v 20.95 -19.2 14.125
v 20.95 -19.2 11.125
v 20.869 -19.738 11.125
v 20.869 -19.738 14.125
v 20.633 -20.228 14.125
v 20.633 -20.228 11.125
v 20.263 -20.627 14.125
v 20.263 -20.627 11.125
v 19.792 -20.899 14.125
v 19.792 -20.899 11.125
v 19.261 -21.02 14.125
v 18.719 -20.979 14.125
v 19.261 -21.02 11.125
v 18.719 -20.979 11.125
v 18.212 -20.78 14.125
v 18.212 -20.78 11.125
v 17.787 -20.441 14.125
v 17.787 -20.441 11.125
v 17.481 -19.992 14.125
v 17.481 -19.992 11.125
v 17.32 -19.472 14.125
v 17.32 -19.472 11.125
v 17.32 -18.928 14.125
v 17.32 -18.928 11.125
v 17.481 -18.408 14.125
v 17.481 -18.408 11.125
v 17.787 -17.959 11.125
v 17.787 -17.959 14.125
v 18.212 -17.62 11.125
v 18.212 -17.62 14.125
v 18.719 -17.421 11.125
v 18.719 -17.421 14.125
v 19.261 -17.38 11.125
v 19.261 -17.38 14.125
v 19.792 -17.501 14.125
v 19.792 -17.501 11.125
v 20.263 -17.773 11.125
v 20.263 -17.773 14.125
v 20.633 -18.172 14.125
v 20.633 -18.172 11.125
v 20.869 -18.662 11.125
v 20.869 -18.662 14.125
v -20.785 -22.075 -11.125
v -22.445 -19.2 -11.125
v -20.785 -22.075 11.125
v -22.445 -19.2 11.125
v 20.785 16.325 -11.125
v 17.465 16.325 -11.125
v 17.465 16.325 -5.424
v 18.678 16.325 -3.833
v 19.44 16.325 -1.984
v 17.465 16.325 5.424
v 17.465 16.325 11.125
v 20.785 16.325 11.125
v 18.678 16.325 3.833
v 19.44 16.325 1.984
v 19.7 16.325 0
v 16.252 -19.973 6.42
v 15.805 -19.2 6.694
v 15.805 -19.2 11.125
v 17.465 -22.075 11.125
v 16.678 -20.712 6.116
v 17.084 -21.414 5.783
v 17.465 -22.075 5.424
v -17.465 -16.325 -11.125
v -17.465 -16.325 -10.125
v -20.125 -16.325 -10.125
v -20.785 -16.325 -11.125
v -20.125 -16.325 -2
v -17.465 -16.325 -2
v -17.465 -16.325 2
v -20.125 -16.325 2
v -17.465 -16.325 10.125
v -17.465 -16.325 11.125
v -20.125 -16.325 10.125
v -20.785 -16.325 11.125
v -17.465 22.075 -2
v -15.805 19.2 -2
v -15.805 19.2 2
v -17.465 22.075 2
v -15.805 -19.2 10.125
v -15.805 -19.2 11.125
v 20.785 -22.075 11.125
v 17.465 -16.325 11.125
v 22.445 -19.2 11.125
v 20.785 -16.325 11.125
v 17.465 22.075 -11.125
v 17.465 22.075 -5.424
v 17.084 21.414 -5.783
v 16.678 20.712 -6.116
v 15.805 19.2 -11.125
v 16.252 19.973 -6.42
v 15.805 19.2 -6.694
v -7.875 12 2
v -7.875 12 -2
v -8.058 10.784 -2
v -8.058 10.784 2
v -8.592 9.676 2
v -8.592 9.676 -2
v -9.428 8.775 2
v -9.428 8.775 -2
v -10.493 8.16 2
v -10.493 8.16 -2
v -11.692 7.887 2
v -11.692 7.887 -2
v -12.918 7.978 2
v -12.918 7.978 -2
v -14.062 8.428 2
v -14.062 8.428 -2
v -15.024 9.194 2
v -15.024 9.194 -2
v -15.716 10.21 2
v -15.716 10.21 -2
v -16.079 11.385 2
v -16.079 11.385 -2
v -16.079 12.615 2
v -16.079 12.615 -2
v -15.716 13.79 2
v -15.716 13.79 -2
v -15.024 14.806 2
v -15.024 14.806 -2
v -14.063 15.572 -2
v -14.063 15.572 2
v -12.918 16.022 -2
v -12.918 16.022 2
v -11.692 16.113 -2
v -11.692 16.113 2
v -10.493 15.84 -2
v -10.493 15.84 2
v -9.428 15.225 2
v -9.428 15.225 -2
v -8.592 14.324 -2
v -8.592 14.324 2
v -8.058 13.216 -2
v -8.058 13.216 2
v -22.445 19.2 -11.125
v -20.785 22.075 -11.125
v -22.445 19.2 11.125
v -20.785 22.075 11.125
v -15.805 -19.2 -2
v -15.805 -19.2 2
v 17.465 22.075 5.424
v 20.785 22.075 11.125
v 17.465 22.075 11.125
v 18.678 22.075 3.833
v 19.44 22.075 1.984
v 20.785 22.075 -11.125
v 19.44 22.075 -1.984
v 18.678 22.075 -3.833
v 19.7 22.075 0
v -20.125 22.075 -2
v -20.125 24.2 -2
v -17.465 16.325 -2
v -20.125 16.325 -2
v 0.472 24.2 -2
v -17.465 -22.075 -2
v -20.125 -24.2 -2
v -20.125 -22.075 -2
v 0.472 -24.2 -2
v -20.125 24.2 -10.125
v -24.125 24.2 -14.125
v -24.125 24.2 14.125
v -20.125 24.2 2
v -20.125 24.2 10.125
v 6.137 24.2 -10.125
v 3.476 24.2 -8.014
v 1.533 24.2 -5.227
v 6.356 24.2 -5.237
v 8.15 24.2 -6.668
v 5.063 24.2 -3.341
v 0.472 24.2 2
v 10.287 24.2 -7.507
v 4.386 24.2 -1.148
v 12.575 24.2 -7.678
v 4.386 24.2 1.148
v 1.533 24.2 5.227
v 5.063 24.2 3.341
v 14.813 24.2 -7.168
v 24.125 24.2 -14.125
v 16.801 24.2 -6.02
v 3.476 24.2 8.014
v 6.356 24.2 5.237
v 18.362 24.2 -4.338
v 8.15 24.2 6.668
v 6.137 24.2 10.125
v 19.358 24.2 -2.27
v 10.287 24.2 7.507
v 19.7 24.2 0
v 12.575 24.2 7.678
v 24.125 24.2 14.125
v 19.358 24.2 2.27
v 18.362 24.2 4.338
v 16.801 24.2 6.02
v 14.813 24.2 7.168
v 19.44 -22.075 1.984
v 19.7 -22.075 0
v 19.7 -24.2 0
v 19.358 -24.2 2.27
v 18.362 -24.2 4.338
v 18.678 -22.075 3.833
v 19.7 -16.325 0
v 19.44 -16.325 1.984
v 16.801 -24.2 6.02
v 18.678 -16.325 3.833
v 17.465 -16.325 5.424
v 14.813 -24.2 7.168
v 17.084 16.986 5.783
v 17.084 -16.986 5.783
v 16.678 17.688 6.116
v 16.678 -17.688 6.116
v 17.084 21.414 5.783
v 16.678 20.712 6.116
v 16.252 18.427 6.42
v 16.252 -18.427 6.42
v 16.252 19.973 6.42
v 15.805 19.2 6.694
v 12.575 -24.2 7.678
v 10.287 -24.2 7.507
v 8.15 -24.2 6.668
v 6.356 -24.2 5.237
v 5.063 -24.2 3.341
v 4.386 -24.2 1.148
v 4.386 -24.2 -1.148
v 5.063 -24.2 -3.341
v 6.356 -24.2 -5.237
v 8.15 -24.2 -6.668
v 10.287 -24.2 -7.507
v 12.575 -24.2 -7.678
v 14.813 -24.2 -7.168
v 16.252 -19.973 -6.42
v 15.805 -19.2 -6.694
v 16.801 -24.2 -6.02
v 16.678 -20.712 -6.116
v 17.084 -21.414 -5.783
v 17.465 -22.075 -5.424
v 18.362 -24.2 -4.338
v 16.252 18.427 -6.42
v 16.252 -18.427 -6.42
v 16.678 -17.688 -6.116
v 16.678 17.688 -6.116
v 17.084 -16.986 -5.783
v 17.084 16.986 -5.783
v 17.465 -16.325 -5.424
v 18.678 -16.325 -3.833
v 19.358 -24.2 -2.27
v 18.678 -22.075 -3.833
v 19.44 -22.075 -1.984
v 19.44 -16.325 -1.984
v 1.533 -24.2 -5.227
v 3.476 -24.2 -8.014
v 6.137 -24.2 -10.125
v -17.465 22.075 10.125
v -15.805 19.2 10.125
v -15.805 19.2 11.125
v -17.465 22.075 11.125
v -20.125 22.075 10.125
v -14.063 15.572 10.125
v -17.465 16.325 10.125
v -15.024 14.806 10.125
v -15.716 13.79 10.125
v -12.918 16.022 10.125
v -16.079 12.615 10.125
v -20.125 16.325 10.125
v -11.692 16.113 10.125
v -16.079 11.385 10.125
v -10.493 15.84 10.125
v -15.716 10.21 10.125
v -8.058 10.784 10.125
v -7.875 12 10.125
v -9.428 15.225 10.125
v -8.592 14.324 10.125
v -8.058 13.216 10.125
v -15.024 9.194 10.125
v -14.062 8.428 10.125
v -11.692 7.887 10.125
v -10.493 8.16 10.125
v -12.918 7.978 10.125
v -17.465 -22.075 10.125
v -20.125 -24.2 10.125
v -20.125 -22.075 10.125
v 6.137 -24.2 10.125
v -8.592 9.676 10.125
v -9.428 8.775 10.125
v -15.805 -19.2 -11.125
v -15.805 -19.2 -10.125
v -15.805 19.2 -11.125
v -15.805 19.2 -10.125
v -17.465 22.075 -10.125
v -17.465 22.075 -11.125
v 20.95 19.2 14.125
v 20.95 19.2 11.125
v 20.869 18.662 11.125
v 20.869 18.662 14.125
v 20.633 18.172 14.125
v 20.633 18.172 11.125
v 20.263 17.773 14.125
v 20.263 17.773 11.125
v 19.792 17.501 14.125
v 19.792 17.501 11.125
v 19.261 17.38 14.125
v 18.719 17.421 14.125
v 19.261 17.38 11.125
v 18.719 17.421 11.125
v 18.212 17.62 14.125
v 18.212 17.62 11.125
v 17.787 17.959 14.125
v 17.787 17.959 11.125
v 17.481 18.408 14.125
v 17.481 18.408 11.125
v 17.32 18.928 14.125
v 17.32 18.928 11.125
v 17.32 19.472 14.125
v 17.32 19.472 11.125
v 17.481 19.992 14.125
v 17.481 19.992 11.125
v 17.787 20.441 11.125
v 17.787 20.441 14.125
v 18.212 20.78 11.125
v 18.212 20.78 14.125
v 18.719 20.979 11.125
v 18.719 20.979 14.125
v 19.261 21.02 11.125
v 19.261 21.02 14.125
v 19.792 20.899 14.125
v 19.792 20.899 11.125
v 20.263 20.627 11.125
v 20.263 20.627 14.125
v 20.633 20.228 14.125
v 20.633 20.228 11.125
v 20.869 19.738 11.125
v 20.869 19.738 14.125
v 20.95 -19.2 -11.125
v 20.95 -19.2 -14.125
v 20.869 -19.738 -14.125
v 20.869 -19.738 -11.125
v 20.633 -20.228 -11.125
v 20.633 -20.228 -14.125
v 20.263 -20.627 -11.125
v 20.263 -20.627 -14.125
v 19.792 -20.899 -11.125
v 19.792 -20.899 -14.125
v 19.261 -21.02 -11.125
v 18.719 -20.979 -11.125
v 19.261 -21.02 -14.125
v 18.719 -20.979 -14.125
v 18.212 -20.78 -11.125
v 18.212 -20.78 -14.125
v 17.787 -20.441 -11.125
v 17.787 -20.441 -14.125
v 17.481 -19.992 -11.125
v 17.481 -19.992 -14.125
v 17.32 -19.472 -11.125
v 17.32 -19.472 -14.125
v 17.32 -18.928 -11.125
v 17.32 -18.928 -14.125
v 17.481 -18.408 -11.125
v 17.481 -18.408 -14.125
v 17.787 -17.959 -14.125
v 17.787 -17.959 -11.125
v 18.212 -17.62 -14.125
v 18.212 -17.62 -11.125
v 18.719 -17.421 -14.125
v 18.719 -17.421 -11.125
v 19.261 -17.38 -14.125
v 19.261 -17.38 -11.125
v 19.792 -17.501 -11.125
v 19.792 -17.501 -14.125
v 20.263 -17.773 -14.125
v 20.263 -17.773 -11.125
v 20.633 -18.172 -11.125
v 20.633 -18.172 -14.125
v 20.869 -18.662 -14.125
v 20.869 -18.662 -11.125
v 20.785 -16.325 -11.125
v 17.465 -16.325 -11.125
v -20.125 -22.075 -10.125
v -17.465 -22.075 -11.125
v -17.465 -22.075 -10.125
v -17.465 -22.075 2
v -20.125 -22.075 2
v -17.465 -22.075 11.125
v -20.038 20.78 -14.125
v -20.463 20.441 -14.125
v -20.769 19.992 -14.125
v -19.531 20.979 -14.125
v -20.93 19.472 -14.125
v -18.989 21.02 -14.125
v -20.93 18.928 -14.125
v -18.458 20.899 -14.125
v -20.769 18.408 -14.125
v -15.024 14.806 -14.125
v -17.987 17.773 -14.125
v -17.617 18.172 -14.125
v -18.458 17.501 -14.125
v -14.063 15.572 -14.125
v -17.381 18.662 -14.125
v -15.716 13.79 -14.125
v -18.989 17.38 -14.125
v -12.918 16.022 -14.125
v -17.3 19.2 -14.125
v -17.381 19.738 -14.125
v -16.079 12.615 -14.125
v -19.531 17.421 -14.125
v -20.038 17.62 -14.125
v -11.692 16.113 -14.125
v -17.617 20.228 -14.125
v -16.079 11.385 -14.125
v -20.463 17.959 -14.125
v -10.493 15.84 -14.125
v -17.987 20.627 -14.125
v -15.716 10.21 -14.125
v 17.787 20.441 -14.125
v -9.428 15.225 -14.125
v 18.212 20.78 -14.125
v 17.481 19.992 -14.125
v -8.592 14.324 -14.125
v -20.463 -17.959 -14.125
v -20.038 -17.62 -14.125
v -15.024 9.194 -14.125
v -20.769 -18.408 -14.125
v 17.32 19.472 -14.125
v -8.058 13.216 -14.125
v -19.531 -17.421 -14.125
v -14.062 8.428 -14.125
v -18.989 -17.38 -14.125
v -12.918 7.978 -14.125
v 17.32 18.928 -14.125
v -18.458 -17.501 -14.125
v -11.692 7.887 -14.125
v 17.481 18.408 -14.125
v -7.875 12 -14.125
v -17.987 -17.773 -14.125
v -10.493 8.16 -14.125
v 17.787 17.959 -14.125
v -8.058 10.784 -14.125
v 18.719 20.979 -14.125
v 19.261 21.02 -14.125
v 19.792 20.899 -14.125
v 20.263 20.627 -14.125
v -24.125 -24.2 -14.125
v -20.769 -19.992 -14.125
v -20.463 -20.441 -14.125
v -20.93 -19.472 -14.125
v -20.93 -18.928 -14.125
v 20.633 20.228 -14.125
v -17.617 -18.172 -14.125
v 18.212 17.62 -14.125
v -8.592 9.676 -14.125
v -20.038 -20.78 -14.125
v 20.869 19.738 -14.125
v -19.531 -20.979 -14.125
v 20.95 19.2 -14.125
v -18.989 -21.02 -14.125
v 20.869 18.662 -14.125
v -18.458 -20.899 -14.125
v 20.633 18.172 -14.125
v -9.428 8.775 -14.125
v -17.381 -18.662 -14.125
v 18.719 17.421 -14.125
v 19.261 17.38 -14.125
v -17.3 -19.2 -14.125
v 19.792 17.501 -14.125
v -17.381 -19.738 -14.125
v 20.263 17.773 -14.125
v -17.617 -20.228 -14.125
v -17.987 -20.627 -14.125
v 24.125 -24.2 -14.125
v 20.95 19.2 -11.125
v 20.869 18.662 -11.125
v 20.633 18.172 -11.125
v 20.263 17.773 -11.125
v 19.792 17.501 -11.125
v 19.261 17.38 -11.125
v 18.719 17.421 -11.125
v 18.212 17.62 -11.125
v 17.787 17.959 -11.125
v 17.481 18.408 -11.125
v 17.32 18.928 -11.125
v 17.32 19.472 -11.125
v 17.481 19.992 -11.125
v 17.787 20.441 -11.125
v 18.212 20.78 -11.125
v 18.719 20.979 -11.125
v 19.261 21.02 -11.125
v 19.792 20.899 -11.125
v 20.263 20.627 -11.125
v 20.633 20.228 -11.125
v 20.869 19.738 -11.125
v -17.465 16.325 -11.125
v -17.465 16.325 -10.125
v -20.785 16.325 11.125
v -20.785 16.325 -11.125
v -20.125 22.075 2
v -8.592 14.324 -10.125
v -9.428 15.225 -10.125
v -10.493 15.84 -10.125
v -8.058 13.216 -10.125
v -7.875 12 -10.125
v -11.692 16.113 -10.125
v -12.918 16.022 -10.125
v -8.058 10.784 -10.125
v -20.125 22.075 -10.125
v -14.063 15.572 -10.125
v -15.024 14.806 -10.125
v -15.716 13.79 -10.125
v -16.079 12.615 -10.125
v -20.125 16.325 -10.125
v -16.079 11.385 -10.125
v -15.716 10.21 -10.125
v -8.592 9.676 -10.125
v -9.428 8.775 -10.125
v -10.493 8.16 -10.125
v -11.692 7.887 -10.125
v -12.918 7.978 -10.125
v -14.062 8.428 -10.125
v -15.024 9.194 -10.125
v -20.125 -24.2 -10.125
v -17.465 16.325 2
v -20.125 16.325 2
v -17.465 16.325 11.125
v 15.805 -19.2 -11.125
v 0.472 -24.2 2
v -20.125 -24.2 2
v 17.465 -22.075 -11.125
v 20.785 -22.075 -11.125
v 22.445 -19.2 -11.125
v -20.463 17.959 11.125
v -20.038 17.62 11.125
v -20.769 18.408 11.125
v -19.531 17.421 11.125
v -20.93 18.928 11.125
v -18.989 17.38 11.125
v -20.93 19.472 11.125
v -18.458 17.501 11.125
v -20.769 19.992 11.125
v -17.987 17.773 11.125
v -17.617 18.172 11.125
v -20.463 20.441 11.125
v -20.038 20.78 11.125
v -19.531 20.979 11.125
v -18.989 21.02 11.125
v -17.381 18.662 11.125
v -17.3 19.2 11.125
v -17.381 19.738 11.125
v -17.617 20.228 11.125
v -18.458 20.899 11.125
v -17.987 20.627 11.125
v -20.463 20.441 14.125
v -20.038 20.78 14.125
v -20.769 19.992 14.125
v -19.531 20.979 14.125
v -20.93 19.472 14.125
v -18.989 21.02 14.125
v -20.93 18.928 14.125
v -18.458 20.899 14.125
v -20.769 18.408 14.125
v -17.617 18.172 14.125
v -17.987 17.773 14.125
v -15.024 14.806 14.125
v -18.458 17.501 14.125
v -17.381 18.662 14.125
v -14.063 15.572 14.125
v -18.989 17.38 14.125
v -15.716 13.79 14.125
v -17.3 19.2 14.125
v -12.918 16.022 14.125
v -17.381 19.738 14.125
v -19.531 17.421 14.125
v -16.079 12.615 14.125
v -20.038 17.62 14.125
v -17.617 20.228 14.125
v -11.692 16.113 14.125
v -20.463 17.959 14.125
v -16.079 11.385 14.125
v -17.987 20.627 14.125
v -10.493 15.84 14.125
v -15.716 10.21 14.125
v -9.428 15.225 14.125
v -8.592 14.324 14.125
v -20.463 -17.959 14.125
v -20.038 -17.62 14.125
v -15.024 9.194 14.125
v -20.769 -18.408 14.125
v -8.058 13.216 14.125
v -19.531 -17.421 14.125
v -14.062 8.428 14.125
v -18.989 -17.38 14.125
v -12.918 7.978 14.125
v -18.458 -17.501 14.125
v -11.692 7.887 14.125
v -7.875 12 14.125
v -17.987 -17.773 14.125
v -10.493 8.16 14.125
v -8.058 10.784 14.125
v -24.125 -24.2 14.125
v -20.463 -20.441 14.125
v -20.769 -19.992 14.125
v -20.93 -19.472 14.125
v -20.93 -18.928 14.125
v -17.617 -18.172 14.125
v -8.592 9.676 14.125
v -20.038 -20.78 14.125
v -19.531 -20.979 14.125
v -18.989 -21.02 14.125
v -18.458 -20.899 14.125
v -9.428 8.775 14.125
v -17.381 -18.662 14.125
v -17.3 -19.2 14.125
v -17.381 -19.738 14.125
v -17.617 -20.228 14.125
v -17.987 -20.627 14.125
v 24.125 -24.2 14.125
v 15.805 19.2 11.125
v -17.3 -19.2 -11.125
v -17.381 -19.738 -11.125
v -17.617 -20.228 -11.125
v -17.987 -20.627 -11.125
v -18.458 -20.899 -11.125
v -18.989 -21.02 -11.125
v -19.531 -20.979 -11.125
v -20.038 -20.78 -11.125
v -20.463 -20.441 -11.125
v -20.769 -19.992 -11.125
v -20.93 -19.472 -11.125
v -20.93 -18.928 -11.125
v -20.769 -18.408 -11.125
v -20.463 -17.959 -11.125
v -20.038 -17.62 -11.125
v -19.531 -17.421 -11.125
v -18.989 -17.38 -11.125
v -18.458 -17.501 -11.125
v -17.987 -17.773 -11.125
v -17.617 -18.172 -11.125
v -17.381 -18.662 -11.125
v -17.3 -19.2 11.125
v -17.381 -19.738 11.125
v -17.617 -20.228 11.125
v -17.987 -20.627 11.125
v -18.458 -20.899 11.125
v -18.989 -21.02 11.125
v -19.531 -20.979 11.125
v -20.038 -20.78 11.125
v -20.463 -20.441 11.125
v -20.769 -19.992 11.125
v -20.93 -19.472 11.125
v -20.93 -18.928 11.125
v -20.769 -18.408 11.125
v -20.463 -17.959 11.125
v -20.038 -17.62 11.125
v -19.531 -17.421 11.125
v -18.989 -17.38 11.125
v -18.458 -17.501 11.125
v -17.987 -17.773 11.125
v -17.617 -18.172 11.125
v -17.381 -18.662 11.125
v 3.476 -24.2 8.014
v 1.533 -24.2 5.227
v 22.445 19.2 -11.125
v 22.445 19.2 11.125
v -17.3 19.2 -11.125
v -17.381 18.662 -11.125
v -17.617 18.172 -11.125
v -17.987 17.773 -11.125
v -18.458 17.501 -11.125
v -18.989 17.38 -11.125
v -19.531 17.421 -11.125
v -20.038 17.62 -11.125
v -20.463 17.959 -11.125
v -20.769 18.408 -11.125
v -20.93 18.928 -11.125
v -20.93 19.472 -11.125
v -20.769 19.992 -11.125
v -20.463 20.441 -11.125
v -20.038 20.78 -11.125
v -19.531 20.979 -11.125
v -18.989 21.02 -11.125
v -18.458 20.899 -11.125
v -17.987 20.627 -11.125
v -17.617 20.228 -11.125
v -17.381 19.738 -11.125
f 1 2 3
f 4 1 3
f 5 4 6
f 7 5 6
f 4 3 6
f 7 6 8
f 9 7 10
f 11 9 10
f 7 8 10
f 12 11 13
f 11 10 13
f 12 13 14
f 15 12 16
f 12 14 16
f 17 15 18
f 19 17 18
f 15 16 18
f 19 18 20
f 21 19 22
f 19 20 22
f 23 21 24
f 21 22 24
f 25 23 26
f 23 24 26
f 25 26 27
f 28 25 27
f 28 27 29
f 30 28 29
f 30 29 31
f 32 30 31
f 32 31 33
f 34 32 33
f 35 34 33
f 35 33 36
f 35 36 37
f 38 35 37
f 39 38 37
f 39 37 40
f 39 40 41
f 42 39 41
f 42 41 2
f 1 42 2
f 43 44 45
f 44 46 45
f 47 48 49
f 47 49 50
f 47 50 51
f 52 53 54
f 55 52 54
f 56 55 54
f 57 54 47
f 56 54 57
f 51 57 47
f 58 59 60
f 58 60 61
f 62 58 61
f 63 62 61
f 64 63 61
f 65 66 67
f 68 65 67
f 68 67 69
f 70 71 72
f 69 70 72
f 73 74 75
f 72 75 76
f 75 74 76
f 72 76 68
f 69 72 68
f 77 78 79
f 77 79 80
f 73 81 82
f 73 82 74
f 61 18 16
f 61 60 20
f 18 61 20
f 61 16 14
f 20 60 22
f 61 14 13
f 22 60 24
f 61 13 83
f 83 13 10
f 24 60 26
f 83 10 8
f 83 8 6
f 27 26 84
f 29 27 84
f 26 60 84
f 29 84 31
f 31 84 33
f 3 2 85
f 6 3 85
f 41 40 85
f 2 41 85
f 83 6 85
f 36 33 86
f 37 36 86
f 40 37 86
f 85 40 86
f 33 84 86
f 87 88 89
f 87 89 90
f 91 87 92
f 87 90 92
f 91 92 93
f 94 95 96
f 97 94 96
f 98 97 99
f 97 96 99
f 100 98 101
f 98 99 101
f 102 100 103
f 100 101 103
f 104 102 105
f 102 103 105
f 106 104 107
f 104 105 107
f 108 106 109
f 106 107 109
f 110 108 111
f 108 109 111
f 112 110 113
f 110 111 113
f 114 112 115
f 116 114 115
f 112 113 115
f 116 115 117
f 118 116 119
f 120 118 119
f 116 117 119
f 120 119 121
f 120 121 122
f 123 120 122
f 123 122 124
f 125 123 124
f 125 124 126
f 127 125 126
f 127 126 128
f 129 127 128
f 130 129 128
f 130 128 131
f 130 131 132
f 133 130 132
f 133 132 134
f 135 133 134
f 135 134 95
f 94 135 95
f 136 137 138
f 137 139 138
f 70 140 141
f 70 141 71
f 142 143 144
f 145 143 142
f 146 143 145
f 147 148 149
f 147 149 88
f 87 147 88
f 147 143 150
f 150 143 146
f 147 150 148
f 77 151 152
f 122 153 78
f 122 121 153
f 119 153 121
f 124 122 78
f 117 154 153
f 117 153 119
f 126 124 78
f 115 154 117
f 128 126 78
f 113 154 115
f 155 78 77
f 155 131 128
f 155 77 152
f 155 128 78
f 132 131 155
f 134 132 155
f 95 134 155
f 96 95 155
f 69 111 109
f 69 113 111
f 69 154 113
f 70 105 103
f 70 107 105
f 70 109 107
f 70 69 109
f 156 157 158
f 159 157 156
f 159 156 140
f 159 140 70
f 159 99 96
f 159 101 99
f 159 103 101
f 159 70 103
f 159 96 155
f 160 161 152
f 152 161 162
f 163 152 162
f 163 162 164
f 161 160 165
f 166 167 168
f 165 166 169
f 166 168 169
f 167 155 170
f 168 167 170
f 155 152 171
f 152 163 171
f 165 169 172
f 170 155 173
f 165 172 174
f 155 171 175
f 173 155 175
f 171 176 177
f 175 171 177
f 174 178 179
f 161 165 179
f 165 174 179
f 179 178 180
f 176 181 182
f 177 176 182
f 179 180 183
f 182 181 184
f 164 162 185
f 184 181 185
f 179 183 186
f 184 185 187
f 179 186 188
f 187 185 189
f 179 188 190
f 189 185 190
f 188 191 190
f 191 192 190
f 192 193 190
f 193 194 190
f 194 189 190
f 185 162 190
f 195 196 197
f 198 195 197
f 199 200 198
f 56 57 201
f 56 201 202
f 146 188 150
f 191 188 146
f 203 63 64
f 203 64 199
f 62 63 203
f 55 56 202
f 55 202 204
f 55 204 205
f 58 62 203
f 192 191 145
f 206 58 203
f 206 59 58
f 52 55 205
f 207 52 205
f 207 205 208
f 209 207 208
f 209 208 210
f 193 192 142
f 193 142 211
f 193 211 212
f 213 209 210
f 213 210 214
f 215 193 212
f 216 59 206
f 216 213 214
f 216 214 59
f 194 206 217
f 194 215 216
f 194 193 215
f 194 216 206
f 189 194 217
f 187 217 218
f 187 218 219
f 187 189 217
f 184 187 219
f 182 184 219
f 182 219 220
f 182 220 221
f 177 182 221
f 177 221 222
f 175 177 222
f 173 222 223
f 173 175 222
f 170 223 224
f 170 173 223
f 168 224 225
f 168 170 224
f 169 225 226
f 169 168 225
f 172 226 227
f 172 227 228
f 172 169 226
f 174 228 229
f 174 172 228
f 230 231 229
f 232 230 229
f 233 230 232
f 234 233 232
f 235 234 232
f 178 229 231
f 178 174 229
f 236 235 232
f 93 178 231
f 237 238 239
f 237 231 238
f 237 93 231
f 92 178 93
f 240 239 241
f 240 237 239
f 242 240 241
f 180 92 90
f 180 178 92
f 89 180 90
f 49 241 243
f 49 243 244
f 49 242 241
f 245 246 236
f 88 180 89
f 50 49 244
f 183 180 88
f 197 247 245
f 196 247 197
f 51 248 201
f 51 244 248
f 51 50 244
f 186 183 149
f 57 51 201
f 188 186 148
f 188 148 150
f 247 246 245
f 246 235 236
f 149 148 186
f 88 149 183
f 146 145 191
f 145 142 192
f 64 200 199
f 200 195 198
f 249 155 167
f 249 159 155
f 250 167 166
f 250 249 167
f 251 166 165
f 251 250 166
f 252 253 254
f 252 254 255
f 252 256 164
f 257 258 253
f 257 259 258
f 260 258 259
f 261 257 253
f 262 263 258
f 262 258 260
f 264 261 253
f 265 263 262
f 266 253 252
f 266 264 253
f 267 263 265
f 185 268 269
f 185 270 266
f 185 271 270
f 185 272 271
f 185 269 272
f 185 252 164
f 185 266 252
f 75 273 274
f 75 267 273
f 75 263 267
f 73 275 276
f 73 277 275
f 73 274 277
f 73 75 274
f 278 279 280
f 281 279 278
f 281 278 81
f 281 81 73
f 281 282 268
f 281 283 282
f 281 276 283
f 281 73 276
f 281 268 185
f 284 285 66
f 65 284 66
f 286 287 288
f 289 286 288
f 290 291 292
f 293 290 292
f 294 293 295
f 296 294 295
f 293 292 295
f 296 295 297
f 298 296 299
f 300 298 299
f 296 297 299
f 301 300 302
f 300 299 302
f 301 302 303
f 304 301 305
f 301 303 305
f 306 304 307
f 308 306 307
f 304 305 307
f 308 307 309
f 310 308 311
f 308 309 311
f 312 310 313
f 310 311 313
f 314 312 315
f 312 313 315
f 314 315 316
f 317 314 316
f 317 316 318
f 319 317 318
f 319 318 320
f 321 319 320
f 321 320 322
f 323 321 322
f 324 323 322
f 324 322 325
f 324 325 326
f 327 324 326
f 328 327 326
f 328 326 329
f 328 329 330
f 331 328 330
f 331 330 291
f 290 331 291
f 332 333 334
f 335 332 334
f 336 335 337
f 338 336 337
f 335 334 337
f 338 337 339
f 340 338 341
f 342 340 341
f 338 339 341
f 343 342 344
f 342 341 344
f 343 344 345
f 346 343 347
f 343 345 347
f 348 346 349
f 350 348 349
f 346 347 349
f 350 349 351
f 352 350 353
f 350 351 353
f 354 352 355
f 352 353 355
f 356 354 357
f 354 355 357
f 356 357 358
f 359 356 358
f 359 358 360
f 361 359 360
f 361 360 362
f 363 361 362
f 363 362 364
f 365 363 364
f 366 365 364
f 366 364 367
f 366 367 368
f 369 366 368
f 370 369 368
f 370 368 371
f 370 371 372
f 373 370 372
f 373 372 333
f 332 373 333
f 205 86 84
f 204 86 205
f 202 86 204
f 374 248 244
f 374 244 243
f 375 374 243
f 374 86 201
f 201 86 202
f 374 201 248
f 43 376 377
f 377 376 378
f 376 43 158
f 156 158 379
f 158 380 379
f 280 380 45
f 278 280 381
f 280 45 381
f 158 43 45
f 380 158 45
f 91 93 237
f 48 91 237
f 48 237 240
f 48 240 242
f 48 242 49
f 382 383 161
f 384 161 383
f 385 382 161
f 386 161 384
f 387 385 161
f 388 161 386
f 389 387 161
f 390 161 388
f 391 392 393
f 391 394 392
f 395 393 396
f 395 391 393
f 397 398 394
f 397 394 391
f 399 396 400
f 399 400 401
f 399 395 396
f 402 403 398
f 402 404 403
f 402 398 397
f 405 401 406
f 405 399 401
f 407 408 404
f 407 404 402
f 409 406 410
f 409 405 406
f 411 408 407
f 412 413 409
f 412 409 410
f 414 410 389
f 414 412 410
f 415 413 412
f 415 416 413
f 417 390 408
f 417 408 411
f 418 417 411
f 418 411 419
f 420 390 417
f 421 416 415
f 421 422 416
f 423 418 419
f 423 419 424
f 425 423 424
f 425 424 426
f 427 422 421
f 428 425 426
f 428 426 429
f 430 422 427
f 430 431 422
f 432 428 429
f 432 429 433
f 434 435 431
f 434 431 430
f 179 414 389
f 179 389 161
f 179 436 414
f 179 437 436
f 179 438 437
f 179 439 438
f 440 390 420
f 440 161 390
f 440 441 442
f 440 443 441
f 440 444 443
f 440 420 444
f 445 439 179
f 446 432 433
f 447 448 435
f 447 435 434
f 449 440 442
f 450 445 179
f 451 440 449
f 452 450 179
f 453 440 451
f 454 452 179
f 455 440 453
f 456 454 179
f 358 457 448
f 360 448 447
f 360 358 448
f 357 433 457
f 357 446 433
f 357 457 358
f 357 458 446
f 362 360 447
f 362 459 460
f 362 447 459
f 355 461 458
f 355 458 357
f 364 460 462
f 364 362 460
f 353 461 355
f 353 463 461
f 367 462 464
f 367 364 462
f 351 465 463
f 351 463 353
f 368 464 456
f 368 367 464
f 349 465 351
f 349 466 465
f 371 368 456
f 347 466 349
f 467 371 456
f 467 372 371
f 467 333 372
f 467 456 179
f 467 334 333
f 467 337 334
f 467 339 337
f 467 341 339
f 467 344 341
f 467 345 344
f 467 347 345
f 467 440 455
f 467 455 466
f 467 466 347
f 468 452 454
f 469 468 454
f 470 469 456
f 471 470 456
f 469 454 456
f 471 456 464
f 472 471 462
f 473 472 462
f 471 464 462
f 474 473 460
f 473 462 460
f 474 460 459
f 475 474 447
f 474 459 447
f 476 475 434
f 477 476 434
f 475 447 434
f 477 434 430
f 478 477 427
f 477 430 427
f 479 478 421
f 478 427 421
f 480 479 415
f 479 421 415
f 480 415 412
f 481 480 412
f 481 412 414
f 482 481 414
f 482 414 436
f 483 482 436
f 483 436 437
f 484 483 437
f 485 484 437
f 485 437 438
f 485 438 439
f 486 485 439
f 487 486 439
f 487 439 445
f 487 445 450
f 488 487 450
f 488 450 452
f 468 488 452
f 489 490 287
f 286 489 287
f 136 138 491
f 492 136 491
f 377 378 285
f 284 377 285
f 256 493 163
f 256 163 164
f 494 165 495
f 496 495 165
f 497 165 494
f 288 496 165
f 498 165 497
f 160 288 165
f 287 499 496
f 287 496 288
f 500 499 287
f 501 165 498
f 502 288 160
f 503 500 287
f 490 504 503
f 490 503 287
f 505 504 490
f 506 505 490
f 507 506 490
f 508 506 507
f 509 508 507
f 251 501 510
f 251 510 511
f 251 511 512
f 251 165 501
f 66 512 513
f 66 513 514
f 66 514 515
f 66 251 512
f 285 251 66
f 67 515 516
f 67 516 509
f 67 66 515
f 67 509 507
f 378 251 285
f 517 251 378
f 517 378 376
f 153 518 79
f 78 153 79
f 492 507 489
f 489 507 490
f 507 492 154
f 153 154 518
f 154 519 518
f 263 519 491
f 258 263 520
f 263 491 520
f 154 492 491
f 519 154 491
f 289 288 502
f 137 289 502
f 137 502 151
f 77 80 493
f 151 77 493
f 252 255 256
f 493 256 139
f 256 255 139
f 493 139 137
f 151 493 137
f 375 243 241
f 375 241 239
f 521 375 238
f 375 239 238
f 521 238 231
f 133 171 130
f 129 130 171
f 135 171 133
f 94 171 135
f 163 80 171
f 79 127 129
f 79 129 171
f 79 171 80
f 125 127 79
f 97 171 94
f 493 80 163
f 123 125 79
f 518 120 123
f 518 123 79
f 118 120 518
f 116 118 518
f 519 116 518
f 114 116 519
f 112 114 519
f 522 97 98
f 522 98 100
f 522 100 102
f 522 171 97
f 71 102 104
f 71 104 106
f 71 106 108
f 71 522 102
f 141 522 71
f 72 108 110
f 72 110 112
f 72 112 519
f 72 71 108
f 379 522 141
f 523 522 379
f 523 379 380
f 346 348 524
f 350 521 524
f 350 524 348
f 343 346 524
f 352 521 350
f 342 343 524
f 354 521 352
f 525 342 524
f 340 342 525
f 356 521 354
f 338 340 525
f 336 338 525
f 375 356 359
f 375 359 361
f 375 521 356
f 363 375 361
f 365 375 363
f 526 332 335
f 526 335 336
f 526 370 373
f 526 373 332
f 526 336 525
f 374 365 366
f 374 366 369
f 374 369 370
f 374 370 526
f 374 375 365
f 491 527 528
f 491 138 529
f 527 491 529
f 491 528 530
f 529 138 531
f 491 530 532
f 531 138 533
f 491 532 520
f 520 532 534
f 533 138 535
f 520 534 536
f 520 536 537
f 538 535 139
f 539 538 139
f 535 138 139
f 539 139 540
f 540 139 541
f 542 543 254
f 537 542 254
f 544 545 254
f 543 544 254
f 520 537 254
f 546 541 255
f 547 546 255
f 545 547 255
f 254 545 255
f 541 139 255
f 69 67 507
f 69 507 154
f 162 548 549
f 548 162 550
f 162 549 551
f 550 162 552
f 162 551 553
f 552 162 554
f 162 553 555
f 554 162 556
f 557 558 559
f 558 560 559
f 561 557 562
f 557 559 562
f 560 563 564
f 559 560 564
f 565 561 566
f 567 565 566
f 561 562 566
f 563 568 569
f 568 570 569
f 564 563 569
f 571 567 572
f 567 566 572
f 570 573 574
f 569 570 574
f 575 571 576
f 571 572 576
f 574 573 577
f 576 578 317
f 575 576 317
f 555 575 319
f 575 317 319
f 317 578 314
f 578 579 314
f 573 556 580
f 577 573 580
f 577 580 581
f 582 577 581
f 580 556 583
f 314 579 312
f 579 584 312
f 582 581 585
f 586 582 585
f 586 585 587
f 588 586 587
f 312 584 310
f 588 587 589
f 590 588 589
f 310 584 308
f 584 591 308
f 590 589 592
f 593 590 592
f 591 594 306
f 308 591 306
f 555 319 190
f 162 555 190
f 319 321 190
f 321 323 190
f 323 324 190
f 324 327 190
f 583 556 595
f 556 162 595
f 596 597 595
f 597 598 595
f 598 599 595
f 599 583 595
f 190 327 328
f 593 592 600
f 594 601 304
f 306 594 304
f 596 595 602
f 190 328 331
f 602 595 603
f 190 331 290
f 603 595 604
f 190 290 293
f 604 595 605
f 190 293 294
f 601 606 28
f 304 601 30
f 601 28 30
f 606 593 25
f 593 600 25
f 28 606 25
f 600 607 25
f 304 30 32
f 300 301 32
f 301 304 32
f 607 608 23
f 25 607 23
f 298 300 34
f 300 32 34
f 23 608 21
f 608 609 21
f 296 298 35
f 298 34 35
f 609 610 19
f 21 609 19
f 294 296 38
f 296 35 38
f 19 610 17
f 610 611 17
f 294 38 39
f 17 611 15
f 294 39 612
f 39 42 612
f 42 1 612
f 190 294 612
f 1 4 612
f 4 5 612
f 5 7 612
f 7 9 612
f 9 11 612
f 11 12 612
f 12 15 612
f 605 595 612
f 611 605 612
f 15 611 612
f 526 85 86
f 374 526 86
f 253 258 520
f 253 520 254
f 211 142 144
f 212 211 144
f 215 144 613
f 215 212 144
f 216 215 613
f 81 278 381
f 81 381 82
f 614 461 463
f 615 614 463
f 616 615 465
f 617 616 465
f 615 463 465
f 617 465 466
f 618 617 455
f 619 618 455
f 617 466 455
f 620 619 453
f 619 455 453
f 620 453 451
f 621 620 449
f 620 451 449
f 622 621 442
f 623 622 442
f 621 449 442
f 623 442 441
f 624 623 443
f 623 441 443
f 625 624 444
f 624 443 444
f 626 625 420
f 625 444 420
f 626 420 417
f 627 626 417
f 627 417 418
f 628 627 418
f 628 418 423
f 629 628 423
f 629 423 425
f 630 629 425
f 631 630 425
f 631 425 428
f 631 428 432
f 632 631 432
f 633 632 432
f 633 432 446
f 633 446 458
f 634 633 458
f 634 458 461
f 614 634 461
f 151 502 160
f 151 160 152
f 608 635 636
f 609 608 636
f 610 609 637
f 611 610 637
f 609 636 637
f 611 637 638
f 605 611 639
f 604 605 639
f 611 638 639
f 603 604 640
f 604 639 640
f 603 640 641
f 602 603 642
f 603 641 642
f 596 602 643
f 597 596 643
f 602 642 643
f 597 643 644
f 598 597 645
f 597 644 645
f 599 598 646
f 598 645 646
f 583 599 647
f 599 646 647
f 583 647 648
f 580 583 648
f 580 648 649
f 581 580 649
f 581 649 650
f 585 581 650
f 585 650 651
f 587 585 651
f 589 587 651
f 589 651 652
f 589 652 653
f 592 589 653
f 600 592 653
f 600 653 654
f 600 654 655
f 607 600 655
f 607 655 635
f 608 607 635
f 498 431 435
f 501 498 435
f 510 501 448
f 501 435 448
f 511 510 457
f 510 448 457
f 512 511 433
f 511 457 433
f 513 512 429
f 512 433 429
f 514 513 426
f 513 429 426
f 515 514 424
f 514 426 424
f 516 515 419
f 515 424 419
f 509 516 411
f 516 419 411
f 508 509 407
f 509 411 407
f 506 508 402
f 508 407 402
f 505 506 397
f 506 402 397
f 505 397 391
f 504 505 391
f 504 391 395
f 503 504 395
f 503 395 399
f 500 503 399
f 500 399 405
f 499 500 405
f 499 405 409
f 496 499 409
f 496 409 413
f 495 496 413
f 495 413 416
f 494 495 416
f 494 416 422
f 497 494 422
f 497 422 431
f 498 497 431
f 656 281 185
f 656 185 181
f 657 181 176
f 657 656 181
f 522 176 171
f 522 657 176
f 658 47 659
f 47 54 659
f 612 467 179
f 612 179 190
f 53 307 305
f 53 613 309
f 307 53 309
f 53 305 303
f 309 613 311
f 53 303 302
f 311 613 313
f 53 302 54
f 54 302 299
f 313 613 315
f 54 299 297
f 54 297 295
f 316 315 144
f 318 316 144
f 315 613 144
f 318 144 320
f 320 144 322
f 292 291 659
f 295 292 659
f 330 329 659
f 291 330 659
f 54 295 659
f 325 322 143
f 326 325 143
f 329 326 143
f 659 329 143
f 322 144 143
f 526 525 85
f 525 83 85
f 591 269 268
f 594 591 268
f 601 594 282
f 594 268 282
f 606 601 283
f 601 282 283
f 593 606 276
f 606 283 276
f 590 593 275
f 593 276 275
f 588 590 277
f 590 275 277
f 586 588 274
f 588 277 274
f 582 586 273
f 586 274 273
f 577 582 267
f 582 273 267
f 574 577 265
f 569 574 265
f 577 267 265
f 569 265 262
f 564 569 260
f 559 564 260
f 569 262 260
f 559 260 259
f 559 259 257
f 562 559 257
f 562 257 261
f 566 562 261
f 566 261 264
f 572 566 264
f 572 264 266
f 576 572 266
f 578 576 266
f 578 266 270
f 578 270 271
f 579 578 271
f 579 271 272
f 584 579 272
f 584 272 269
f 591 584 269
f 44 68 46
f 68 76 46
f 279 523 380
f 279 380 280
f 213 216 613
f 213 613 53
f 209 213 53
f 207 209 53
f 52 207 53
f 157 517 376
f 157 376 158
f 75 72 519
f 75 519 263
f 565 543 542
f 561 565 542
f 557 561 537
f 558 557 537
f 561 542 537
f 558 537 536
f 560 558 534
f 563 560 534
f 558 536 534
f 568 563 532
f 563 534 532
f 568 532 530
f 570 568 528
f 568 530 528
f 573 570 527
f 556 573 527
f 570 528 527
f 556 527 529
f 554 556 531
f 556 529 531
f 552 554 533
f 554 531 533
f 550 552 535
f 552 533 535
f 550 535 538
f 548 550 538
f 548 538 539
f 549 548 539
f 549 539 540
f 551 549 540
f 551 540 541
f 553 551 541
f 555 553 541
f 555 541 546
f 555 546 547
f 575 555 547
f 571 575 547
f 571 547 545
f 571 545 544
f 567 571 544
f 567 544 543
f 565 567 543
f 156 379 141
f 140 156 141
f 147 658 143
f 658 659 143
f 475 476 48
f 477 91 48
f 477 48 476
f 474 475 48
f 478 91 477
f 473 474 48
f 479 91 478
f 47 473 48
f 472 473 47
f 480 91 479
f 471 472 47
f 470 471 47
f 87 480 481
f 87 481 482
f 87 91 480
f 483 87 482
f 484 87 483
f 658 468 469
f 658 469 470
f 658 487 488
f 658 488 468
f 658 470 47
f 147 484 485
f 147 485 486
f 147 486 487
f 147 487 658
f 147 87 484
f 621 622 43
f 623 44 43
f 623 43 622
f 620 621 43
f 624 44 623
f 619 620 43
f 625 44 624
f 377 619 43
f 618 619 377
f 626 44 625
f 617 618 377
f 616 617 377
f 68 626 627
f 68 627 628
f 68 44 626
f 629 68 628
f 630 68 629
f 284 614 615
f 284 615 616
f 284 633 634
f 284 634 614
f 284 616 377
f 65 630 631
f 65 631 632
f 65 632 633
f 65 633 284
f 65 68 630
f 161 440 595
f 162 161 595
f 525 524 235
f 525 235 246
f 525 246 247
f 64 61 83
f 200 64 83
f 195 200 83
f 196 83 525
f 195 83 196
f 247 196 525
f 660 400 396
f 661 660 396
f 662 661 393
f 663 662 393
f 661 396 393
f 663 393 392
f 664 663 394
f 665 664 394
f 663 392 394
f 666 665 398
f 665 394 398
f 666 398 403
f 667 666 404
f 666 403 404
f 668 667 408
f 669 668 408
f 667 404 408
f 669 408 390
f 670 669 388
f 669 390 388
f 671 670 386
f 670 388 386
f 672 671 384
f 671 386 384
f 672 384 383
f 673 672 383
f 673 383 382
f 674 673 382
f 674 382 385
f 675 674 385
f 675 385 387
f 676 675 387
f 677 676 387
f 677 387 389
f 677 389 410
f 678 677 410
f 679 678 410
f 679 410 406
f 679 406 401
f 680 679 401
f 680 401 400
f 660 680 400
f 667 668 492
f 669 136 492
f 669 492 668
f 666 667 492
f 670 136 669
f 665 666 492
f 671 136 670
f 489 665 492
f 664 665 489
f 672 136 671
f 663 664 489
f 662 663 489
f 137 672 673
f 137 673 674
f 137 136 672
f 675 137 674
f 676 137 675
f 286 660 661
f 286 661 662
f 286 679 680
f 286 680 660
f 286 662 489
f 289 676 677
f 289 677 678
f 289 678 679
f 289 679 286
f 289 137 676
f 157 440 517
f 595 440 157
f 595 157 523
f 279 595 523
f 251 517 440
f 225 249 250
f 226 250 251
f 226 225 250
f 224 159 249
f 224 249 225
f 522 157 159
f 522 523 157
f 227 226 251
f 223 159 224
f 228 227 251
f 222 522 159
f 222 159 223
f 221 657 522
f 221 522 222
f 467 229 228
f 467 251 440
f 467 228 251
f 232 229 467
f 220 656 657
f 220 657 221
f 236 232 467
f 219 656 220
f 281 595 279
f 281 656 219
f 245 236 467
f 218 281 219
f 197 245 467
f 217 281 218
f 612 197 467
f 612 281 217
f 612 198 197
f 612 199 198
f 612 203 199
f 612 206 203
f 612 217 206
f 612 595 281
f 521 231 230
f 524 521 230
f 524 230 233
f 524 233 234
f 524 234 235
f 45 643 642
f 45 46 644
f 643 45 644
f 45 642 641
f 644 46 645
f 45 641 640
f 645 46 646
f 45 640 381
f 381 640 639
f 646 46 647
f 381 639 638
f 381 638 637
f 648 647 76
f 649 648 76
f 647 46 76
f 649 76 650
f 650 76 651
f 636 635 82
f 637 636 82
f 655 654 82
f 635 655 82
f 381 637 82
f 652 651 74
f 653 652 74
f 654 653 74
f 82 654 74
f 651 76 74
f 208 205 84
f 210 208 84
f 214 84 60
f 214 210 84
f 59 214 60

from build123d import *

# Parameters (mm, degrees)
F3_W          = 48.25
F3_H          = 28.25
F3_R          = 7.7
F4_DEPTH      = 24.2
F5_R          = 1.825
F6_DEPTH      = 28.25
F5_R_2        = 4.125
F7_DEPTH      = 28.25
F9_DEPTH      = 13.125
F9_DEPTH_BACK = 9.125


# Not quite as in the source:
# - a feature names something its author has since deleted; it is built from what else it names


with BuildPart() as f4:
    # F3 (on Front) → F4 (new body, symmetric)
    with BuildSketch(Plane.XZ):
        Rectangle(F3_W, F3_H)
        with BuildLine():
            ThreePointArc((23.5277925033, 2), (23.6568686252, 1.0037000824), (23.7, 0))
            ThreePointArc((23.7, 0), (23.6568686252, -1.0037000824), (23.5277925033, -2))
            ThreePointArc((23.5277925033, -2), (22.3372126342, -5.4801491728), (20.125, -8.4186920005))
            Line((20.125, -8.4186920005), (20.125, -10.125))
            Line((20.125, -10.125), (17.8629663994, -10.125))
            ThreePointArc((17.8629663994, -10.125), (15.9935594213, -10.9973398215), (14, -11.5277925033))
            ThreePointArc((14, -11.5277925033), (12, -11.7), (10, -11.5277925033))
            ThreePointArc((10, -11.5277925033), (8.0064405787, -10.9973398215), (6.1370336006, -10.125))
            Line((6.1370336006, -10.125), (-20.125, -10.125))
            Line((-20.125, -10.125), (-20.125, -2))
            Line((-20.125, -2), (-20.125, 2))
            Line((-20.125, 2), (-20.125, 10.125))
            Line((-20.125, 10.125), (6.1370336006, 10.125))
            ThreePointArc((6.1370336006, 10.125), (8.0064405787, 10.9973398215), (10, 11.5277925033))
            ThreePointArc((10, 11.5277925033), (12, 11.7), (14, 11.5277925033))
            ThreePointArc((14, 11.5277925033), (15.9935594213, 10.9973398215), (17.8629663994, 10.125))
            Line((17.8629663994, 10.125), (20.125, 10.125))
            Line((20.125, 10.125), (20.125, 8.4186920005))
            ThreePointArc((20.125, 8.4186920005), (22.3372126342, 5.4801491728), (23.5277925033, 2))
        make_face(mode=Mode.SUBTRACT)
        with BuildLine():
            Line((14, 10.125), (14, 11.5277925033))
            ThreePointArc((14, 11.5277925033), (12, 11.7), (10, 11.5277925033))
            Line((10, 11.5277925033), (10, 10.125))
            Line((10, 10.125), (14, 10.125))
        make_face()
        with BuildLine():
            Line((20.125, 2), (20.125, 8.4186920005))
            ThreePointArc((20.125, 8.4186920005), (19.045826619, 9.3405742466), (17.8629663994, 10.125))
            Line((17.8629663994, 10.125), (14, 10.125))
            Line((14, 10.125), (10, 10.125))
            Line((10, 10.125), (6.1370336006, 10.125))
            ThreePointArc((6.1370336006, 10.125), (2.4024206149, 6.6915222444), (0.4722074967, 2))
            ThreePointArc((0.4722074967, 2), (0.3, 0), (0.4722074967, -2))
            ThreePointArc((0.4722074967, -2), (2.4024206149, -6.6915222444), (6.1370336006, -10.125))
            Line((6.1370336006, -10.125), (10, -10.125))
            Line((10, -10.125), (14, -10.125))
            Line((14, -10.125), (17.8629663994, -10.125))
            ThreePointArc((17.8629663994, -10.125), (19.045826619, -9.3405742466), (20.125, -8.4186920005))
            Line((20.125, -8.4186920005), (20.125, -2))
            Line((20.125, -2), (20.125, 2))
        make_face()
        with Locations((12, 0)):
            Circle(F3_R, mode=Mode.SUBTRACT)
        with BuildLine():
            ThreePointArc((10, -11.5277925033), (12, -11.7), (14, -11.5277925033))
            Line((14, -11.5277925033), (14, -10.125))
            Line((14, -10.125), (10, -10.125))
            Line((10, -10.125), (10, -11.5277925033))
        make_face()
        with BuildLine():
            ThreePointArc((0.4722074967, -2), (0.3, 0), (0.4722074967, 2))
            Line((0.4722074967, 2), (-20.125, 2))
            Line((-20.125, 2), (-20.125, -2))
            Line((-20.125, -2), (0.4722074967, -2))
        make_face()
        with BuildLine():
            ThreePointArc((23.5277925033, -2), (23.6568686252, -1.0037000824), (23.7, 0))
            ThreePointArc((23.7, 0), (23.6568686252, 1.0037000824), (23.5277925033, 2))
            Line((23.5277925033, 2), (20.125, 2))
            Line((20.125, 2), (20.125, -2))
            Line((20.125, -2), (23.5277925033, -2))
        make_face()
        with BuildLine():
            Line((20.125, 2), (23.5277925033, 2))
            ThreePointArc((23.5277925033, 2), (22.3372126342, 5.4801491728), (20.125, 8.4186920005))
            Line((20.125, 8.4186920005), (20.125, 2))
        make_face()
        with BuildLine():
            ThreePointArc((20.125, -8.4186920005), (22.3372126342, -5.4801491728), (23.5277925033, -2))
            Line((23.5277925033, -2), (20.125, -2))
            Line((20.125, -2), (20.125, -8.4186920005))
        make_face()
        with BuildLine():
            Line((14, 10.125), (17.8629663994, 10.125))
            ThreePointArc((17.8629663994, 10.125), (15.9935594213, 10.9973398215), (14, 11.5277925033))
            Line((14, 11.5277925033), (14, 10.125))
        make_face()
        with BuildLine():
            Line((10, 10.125), (10, 11.5277925033))
            ThreePointArc((10, 11.5277925033), (8.0064405787, 10.9973398215), (6.1370336006, 10.125))
            Line((6.1370336006, 10.125), (10, 10.125))
        make_face()
        with BuildLine():
            ThreePointArc((17.8629663994, 10.125), (19.045826619, 9.3405742466), (20.125, 8.4186920005))
            Line((20.125, 8.4186920005), (20.125, 10.125))
            Line((20.125, 10.125), (17.8629663994, 10.125))
        make_face()
        with BuildLine():
            Line((20.125, -10.125), (20.125, -8.4186920005))
            ThreePointArc((20.125, -8.4186920005), (19.045826619, -9.3405742466), (17.8629663994, -10.125))
            Line((17.8629663994, -10.125), (20.125, -10.125))
        make_face()
        with BuildLine():
            ThreePointArc((14, -11.5277925033), (15.9935594213, -10.9973398215), (17.8629663994, -10.125))
            Line((17.8629663994, -10.125), (14, -10.125))
            Line((14, -10.125), (14, -11.5277925033))
        make_face()
        with BuildLine():
            ThreePointArc((6.1370336006, -10.125), (8.0064405787, -10.9973398215), (10, -11.5277925033))
            Line((10, -11.5277925033), (10, -10.125))
            Line((10, -10.125), (6.1370336006, -10.125))
        make_face()
    extrude(amount=F4_DEPTH, both=True)

    # F5 (on face) → F6 (cut)
    with BuildSketch(Plane(origin=(0, 0, -14.125), x_dir=(1, 0, 0), z_dir=(0, 0, -1))):
        with Locations((-19.125, 19.2)):
            Circle(F5_R)
        with Locations((19.125, 19.2)):
            Circle(F5_R)
        with Locations((19.125, -19.2)):
            Circle(F5_R)
        with Locations((-19.125, -19.2)):
            Circle(F5_R)
    extrude(amount=-F6_DEPTH, mode=Mode.SUBTRACT)

    # F5 (on face) → F7 (cut)
    with BuildSketch(Plane(origin=(0, 0, -14.125), x_dir=(1, 0, 0), z_dir=(0, 0, -1))):
        with Locations((-12, -12)):
            Circle(F5_R_2)
    extrude(amount=-F7_DEPTH, mode=Mode.SUBTRACT)

    # F8 (on face) → F9 (cut, two sides)
    with BuildSketch(Plane.XY.offset(2)) as f9_sk:
        Polygon((20.7848820239, -16.325), (17.4651179761, -16.325), (15.8052359522, -19.2), (17.4651179761, -22.075), (20.7848820239, -22.075), (22.4447640478, -19.2), align=None)
        Polygon((17.4651179761, 16.325), (20.7848820239, 16.325), (22.4447640478, 19.2), (20.7848820239, 22.075), (17.4651179761, 22.075), (15.8052359522, 19.2), align=None)
        Polygon((-20.7848820239, 16.325), (-17.4651179761, 16.325), (-15.8052359522, 19.2), (-17.4651179761, 22.075), (-20.7848820239, 22.075), (-22.4447640478, 19.2), align=None)
        Polygon((-17.4651179761, -16.325), (-20.7848820239, -16.325), (-22.4447640478, -19.2), (-20.7848820239, -22.075), (-17.4651179761, -22.075), (-15.8052359522, -19.2), align=None)
    extrude(amount=-F9_DEPTH, mode=Mode.SUBTRACT)
    extrude(f9_sk.sketch, amount=F9_DEPTH_BACK, mode=Mode.SUBTRACT)


solid = f4.part
